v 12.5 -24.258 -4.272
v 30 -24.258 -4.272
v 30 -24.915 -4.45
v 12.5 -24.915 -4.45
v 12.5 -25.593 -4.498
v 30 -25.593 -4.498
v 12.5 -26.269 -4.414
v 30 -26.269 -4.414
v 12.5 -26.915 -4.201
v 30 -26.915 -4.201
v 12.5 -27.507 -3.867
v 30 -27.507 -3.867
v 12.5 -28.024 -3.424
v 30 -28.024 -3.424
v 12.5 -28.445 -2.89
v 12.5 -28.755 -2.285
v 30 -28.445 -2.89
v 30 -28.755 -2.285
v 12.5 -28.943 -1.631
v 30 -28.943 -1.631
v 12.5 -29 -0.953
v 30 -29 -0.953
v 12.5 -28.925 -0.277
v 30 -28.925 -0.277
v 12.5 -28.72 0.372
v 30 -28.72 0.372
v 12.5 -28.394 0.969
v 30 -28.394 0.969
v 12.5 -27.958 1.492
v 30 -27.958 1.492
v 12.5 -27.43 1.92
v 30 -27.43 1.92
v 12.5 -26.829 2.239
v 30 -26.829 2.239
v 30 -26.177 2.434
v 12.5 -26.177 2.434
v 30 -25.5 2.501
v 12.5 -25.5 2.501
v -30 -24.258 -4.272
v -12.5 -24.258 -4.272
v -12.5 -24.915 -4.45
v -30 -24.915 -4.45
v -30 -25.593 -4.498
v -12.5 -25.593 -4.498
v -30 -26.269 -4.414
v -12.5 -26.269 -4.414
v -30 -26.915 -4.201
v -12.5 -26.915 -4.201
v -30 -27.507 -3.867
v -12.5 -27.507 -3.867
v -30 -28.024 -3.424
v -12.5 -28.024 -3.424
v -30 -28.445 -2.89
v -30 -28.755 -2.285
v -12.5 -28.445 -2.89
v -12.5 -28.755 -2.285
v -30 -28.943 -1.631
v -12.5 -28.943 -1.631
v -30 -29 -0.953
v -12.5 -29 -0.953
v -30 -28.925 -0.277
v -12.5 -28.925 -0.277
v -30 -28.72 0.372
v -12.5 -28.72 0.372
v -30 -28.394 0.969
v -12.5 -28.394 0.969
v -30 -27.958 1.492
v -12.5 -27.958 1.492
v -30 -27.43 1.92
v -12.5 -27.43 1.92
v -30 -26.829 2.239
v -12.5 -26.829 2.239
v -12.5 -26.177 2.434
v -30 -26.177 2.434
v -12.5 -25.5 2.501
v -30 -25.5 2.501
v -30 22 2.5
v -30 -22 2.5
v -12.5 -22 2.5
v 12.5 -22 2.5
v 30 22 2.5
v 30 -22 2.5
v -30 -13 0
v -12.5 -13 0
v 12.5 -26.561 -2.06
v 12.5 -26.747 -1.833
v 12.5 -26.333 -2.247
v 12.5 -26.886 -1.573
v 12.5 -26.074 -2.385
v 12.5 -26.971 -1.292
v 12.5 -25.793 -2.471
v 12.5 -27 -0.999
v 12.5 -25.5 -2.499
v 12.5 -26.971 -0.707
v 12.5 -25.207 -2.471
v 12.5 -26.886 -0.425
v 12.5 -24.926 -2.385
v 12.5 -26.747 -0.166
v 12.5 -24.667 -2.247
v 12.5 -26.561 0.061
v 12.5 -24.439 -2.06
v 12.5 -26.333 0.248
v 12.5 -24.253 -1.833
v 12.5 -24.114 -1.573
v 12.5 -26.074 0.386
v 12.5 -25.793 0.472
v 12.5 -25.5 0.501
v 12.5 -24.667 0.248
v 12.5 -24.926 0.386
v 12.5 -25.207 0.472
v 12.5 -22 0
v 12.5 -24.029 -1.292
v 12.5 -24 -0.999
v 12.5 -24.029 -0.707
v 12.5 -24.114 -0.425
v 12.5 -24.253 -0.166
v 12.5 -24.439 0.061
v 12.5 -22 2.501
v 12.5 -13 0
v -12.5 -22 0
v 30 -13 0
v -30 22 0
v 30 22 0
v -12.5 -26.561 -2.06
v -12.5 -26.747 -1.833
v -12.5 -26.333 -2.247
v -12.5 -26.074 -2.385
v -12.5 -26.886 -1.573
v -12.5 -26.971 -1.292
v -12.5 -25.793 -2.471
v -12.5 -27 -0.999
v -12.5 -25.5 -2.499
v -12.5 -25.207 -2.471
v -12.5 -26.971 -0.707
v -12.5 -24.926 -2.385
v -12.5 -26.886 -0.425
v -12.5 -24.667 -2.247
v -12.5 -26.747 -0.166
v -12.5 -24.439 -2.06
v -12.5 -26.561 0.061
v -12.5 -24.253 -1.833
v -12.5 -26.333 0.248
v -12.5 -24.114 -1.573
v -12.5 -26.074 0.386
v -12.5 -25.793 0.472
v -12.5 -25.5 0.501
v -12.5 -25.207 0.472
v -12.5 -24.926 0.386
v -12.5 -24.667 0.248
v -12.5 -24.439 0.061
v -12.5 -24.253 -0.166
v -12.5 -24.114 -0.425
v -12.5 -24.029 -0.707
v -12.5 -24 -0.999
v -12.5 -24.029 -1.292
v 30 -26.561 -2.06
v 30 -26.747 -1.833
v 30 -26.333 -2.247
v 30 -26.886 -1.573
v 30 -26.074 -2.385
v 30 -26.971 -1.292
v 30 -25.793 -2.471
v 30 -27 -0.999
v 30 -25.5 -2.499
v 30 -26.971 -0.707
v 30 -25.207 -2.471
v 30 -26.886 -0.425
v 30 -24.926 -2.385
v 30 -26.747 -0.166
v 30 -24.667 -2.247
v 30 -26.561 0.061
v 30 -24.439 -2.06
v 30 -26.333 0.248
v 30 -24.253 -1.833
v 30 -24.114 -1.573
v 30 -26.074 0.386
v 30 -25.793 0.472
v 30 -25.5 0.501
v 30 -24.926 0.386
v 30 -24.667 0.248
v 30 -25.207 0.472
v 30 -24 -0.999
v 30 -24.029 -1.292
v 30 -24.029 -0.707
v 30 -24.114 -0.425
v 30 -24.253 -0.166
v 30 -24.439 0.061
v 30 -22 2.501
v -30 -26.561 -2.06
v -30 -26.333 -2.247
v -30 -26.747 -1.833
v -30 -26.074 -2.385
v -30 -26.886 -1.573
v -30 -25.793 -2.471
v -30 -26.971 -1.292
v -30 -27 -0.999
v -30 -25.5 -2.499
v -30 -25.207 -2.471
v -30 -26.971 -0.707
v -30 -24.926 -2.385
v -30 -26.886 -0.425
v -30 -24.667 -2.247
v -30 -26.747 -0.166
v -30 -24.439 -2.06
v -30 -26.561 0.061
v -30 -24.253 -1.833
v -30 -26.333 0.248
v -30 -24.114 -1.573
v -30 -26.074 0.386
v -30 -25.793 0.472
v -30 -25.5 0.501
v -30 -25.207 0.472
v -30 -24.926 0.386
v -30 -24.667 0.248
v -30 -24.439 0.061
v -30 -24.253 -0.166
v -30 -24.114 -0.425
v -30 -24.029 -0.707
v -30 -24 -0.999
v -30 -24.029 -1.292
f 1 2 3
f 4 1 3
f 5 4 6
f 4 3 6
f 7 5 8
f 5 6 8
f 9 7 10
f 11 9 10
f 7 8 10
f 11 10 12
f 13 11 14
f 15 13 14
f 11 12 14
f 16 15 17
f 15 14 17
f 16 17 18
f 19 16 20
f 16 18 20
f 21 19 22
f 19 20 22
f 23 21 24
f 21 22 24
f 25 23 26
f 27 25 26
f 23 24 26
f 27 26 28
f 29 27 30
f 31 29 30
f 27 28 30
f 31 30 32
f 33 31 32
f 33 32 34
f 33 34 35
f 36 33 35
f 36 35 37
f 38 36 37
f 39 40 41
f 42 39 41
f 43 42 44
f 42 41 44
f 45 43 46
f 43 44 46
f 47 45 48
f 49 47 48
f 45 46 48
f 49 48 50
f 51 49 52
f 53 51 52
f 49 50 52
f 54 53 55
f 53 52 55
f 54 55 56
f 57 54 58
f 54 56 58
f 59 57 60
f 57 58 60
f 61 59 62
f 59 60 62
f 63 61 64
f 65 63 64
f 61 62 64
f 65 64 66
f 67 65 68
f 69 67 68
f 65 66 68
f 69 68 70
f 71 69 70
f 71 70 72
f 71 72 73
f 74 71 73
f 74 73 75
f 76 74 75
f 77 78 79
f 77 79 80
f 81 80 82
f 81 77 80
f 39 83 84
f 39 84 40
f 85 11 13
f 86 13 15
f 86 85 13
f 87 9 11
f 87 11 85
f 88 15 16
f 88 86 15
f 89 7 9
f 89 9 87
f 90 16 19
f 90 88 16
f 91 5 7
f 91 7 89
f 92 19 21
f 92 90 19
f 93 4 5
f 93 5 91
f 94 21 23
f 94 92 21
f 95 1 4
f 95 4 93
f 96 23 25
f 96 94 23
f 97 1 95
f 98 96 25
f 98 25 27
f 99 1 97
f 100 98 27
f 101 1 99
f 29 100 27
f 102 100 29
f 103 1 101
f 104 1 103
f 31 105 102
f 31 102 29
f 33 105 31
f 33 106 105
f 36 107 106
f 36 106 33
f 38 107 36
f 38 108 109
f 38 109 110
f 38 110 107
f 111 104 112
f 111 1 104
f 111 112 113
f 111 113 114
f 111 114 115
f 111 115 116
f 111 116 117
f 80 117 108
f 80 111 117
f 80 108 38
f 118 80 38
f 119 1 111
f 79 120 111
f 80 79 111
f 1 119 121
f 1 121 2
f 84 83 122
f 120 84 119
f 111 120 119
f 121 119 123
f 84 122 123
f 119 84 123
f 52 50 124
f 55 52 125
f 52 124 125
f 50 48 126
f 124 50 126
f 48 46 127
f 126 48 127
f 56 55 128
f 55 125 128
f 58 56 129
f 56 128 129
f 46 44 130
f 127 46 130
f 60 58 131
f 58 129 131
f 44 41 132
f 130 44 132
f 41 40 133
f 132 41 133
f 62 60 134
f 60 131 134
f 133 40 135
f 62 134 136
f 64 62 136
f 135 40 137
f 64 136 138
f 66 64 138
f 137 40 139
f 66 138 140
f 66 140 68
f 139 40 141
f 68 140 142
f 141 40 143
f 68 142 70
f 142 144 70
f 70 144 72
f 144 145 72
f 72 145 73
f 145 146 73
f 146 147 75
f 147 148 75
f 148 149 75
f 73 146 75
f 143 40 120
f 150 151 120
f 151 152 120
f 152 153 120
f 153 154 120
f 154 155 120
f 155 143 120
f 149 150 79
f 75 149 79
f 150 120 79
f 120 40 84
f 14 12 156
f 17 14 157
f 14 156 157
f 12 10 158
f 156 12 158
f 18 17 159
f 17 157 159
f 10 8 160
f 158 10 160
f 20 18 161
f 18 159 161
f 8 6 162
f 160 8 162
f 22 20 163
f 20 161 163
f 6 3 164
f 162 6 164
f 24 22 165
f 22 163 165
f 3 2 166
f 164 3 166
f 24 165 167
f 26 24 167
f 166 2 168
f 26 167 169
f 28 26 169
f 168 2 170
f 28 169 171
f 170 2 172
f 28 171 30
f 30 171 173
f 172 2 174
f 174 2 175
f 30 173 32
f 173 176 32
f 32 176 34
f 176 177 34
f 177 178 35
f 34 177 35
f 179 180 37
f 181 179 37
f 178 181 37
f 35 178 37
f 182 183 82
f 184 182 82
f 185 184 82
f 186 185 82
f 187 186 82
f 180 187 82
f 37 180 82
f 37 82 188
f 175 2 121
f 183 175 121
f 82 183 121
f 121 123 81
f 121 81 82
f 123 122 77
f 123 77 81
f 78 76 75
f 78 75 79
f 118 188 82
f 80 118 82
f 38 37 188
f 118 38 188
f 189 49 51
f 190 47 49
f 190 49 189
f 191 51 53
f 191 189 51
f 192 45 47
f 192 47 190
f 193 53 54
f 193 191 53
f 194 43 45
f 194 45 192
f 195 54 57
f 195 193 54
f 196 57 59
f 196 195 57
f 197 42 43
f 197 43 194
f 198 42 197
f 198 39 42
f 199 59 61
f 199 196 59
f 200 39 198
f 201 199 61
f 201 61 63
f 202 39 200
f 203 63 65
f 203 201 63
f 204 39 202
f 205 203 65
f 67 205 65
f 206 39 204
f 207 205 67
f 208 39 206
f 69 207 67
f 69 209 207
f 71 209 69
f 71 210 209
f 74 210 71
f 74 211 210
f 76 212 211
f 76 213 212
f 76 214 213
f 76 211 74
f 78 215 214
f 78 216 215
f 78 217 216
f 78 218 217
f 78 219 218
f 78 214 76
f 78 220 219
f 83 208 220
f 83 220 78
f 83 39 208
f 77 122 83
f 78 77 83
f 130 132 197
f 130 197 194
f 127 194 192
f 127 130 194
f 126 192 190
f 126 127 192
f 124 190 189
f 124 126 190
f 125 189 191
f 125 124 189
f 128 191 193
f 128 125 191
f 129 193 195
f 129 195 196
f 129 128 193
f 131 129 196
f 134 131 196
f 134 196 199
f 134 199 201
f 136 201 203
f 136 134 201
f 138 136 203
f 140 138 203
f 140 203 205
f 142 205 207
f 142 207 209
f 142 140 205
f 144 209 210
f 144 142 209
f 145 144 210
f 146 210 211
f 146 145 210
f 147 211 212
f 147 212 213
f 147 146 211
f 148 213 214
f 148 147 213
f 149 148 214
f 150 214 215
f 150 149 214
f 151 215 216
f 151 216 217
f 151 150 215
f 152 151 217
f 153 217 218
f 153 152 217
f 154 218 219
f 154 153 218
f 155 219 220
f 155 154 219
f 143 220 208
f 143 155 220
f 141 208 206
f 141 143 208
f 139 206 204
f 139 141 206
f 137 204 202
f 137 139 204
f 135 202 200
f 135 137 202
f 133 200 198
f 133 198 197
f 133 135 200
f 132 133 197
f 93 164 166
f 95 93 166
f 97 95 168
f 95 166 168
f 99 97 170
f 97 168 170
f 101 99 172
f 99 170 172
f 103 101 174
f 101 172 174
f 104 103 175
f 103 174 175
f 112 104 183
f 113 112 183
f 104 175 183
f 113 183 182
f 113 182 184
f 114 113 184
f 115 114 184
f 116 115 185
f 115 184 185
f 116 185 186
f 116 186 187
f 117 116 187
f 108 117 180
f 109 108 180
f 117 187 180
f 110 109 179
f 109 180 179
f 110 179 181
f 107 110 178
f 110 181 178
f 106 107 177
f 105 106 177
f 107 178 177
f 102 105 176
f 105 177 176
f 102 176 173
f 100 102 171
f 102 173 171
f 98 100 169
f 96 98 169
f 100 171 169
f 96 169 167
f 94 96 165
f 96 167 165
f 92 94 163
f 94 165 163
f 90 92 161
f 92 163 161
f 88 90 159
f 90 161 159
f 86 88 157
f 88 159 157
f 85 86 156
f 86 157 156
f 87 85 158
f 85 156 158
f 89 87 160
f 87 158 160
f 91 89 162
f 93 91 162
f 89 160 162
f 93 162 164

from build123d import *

# Parameters (mm, degrees)
SKETCH_1_W      = 60
SKETCH_1_H      = 44
EXTRUDE_3_DEPTH = 2.5
SKETCH_4_R      = 1.5
EXTRUDE_4_DEPTH = 17.5
EXTRUDE_START   = -17.5
SKETCH_5_R      = 1.5
EXTRUDE_5_DEPTH = 17.5


with BuildPart() as part:
    # 草图1 → 凸台-拉伸3 (new body)
    with BuildSketch(Plane.XY):
        Rectangle(SKETCH_1_W, SKETCH_1_H)
    extrude(amount=EXTRUDE_3_DEPTH)

    # 草图4 → 凸台-拉伸4 (add)
    with BuildSketch(Plane(origin=(30, 0, 0), x_dir=(0, 0, -1), z_dir=(1, 0, 0))):
        with BuildLine():
            Line((0, -22), (0, -13))
            Line((0, -13), (4.271805299, -24.258355855))
            ThreePointArc((4.271805299, -24.258355855), (1.630618235, -28.942618859), (-2.500551622, -25.5))
            Line((-2.500551622, -25.5), (-2.500551622, -22))
            Line((-2.500551622, -22), (0, -22))
        make_face()
        with Locations((0.999448378, -25.5)):
            Circle(SKETCH_4_R, mode=Mode.SUBTRACT)
    extrude(amount=-EXTRUDE_4_DEPTH)

    # 草图5 → 凸台-拉伸5 (add)
    with BuildSketch(Plane.ZY.offset(30).offset(EXTRUDE_START)):
        with BuildLine():
            Line((2.5, -22), (0, -22))
            Line((0, -22), (0, -13))
            Line((0, -13), (-4.271805299, -24.258355855))
            ThreePointArc((-4.271805299, -24.258355855), (-1.630618235, -28.942618859), (2.500551622, -25.5))
            Line((2.500551622, -25.5), (2.5, -22))
        make_face()
        with Locations(Location((-0.999448378, -25.5, 0), (0, 0, 180))):
            Circle(SKETCH_5_R, mode=Mode.SUBTRACT)
    extrude(amount=EXTRUDE_5_DEPTH)


solid = part.part
